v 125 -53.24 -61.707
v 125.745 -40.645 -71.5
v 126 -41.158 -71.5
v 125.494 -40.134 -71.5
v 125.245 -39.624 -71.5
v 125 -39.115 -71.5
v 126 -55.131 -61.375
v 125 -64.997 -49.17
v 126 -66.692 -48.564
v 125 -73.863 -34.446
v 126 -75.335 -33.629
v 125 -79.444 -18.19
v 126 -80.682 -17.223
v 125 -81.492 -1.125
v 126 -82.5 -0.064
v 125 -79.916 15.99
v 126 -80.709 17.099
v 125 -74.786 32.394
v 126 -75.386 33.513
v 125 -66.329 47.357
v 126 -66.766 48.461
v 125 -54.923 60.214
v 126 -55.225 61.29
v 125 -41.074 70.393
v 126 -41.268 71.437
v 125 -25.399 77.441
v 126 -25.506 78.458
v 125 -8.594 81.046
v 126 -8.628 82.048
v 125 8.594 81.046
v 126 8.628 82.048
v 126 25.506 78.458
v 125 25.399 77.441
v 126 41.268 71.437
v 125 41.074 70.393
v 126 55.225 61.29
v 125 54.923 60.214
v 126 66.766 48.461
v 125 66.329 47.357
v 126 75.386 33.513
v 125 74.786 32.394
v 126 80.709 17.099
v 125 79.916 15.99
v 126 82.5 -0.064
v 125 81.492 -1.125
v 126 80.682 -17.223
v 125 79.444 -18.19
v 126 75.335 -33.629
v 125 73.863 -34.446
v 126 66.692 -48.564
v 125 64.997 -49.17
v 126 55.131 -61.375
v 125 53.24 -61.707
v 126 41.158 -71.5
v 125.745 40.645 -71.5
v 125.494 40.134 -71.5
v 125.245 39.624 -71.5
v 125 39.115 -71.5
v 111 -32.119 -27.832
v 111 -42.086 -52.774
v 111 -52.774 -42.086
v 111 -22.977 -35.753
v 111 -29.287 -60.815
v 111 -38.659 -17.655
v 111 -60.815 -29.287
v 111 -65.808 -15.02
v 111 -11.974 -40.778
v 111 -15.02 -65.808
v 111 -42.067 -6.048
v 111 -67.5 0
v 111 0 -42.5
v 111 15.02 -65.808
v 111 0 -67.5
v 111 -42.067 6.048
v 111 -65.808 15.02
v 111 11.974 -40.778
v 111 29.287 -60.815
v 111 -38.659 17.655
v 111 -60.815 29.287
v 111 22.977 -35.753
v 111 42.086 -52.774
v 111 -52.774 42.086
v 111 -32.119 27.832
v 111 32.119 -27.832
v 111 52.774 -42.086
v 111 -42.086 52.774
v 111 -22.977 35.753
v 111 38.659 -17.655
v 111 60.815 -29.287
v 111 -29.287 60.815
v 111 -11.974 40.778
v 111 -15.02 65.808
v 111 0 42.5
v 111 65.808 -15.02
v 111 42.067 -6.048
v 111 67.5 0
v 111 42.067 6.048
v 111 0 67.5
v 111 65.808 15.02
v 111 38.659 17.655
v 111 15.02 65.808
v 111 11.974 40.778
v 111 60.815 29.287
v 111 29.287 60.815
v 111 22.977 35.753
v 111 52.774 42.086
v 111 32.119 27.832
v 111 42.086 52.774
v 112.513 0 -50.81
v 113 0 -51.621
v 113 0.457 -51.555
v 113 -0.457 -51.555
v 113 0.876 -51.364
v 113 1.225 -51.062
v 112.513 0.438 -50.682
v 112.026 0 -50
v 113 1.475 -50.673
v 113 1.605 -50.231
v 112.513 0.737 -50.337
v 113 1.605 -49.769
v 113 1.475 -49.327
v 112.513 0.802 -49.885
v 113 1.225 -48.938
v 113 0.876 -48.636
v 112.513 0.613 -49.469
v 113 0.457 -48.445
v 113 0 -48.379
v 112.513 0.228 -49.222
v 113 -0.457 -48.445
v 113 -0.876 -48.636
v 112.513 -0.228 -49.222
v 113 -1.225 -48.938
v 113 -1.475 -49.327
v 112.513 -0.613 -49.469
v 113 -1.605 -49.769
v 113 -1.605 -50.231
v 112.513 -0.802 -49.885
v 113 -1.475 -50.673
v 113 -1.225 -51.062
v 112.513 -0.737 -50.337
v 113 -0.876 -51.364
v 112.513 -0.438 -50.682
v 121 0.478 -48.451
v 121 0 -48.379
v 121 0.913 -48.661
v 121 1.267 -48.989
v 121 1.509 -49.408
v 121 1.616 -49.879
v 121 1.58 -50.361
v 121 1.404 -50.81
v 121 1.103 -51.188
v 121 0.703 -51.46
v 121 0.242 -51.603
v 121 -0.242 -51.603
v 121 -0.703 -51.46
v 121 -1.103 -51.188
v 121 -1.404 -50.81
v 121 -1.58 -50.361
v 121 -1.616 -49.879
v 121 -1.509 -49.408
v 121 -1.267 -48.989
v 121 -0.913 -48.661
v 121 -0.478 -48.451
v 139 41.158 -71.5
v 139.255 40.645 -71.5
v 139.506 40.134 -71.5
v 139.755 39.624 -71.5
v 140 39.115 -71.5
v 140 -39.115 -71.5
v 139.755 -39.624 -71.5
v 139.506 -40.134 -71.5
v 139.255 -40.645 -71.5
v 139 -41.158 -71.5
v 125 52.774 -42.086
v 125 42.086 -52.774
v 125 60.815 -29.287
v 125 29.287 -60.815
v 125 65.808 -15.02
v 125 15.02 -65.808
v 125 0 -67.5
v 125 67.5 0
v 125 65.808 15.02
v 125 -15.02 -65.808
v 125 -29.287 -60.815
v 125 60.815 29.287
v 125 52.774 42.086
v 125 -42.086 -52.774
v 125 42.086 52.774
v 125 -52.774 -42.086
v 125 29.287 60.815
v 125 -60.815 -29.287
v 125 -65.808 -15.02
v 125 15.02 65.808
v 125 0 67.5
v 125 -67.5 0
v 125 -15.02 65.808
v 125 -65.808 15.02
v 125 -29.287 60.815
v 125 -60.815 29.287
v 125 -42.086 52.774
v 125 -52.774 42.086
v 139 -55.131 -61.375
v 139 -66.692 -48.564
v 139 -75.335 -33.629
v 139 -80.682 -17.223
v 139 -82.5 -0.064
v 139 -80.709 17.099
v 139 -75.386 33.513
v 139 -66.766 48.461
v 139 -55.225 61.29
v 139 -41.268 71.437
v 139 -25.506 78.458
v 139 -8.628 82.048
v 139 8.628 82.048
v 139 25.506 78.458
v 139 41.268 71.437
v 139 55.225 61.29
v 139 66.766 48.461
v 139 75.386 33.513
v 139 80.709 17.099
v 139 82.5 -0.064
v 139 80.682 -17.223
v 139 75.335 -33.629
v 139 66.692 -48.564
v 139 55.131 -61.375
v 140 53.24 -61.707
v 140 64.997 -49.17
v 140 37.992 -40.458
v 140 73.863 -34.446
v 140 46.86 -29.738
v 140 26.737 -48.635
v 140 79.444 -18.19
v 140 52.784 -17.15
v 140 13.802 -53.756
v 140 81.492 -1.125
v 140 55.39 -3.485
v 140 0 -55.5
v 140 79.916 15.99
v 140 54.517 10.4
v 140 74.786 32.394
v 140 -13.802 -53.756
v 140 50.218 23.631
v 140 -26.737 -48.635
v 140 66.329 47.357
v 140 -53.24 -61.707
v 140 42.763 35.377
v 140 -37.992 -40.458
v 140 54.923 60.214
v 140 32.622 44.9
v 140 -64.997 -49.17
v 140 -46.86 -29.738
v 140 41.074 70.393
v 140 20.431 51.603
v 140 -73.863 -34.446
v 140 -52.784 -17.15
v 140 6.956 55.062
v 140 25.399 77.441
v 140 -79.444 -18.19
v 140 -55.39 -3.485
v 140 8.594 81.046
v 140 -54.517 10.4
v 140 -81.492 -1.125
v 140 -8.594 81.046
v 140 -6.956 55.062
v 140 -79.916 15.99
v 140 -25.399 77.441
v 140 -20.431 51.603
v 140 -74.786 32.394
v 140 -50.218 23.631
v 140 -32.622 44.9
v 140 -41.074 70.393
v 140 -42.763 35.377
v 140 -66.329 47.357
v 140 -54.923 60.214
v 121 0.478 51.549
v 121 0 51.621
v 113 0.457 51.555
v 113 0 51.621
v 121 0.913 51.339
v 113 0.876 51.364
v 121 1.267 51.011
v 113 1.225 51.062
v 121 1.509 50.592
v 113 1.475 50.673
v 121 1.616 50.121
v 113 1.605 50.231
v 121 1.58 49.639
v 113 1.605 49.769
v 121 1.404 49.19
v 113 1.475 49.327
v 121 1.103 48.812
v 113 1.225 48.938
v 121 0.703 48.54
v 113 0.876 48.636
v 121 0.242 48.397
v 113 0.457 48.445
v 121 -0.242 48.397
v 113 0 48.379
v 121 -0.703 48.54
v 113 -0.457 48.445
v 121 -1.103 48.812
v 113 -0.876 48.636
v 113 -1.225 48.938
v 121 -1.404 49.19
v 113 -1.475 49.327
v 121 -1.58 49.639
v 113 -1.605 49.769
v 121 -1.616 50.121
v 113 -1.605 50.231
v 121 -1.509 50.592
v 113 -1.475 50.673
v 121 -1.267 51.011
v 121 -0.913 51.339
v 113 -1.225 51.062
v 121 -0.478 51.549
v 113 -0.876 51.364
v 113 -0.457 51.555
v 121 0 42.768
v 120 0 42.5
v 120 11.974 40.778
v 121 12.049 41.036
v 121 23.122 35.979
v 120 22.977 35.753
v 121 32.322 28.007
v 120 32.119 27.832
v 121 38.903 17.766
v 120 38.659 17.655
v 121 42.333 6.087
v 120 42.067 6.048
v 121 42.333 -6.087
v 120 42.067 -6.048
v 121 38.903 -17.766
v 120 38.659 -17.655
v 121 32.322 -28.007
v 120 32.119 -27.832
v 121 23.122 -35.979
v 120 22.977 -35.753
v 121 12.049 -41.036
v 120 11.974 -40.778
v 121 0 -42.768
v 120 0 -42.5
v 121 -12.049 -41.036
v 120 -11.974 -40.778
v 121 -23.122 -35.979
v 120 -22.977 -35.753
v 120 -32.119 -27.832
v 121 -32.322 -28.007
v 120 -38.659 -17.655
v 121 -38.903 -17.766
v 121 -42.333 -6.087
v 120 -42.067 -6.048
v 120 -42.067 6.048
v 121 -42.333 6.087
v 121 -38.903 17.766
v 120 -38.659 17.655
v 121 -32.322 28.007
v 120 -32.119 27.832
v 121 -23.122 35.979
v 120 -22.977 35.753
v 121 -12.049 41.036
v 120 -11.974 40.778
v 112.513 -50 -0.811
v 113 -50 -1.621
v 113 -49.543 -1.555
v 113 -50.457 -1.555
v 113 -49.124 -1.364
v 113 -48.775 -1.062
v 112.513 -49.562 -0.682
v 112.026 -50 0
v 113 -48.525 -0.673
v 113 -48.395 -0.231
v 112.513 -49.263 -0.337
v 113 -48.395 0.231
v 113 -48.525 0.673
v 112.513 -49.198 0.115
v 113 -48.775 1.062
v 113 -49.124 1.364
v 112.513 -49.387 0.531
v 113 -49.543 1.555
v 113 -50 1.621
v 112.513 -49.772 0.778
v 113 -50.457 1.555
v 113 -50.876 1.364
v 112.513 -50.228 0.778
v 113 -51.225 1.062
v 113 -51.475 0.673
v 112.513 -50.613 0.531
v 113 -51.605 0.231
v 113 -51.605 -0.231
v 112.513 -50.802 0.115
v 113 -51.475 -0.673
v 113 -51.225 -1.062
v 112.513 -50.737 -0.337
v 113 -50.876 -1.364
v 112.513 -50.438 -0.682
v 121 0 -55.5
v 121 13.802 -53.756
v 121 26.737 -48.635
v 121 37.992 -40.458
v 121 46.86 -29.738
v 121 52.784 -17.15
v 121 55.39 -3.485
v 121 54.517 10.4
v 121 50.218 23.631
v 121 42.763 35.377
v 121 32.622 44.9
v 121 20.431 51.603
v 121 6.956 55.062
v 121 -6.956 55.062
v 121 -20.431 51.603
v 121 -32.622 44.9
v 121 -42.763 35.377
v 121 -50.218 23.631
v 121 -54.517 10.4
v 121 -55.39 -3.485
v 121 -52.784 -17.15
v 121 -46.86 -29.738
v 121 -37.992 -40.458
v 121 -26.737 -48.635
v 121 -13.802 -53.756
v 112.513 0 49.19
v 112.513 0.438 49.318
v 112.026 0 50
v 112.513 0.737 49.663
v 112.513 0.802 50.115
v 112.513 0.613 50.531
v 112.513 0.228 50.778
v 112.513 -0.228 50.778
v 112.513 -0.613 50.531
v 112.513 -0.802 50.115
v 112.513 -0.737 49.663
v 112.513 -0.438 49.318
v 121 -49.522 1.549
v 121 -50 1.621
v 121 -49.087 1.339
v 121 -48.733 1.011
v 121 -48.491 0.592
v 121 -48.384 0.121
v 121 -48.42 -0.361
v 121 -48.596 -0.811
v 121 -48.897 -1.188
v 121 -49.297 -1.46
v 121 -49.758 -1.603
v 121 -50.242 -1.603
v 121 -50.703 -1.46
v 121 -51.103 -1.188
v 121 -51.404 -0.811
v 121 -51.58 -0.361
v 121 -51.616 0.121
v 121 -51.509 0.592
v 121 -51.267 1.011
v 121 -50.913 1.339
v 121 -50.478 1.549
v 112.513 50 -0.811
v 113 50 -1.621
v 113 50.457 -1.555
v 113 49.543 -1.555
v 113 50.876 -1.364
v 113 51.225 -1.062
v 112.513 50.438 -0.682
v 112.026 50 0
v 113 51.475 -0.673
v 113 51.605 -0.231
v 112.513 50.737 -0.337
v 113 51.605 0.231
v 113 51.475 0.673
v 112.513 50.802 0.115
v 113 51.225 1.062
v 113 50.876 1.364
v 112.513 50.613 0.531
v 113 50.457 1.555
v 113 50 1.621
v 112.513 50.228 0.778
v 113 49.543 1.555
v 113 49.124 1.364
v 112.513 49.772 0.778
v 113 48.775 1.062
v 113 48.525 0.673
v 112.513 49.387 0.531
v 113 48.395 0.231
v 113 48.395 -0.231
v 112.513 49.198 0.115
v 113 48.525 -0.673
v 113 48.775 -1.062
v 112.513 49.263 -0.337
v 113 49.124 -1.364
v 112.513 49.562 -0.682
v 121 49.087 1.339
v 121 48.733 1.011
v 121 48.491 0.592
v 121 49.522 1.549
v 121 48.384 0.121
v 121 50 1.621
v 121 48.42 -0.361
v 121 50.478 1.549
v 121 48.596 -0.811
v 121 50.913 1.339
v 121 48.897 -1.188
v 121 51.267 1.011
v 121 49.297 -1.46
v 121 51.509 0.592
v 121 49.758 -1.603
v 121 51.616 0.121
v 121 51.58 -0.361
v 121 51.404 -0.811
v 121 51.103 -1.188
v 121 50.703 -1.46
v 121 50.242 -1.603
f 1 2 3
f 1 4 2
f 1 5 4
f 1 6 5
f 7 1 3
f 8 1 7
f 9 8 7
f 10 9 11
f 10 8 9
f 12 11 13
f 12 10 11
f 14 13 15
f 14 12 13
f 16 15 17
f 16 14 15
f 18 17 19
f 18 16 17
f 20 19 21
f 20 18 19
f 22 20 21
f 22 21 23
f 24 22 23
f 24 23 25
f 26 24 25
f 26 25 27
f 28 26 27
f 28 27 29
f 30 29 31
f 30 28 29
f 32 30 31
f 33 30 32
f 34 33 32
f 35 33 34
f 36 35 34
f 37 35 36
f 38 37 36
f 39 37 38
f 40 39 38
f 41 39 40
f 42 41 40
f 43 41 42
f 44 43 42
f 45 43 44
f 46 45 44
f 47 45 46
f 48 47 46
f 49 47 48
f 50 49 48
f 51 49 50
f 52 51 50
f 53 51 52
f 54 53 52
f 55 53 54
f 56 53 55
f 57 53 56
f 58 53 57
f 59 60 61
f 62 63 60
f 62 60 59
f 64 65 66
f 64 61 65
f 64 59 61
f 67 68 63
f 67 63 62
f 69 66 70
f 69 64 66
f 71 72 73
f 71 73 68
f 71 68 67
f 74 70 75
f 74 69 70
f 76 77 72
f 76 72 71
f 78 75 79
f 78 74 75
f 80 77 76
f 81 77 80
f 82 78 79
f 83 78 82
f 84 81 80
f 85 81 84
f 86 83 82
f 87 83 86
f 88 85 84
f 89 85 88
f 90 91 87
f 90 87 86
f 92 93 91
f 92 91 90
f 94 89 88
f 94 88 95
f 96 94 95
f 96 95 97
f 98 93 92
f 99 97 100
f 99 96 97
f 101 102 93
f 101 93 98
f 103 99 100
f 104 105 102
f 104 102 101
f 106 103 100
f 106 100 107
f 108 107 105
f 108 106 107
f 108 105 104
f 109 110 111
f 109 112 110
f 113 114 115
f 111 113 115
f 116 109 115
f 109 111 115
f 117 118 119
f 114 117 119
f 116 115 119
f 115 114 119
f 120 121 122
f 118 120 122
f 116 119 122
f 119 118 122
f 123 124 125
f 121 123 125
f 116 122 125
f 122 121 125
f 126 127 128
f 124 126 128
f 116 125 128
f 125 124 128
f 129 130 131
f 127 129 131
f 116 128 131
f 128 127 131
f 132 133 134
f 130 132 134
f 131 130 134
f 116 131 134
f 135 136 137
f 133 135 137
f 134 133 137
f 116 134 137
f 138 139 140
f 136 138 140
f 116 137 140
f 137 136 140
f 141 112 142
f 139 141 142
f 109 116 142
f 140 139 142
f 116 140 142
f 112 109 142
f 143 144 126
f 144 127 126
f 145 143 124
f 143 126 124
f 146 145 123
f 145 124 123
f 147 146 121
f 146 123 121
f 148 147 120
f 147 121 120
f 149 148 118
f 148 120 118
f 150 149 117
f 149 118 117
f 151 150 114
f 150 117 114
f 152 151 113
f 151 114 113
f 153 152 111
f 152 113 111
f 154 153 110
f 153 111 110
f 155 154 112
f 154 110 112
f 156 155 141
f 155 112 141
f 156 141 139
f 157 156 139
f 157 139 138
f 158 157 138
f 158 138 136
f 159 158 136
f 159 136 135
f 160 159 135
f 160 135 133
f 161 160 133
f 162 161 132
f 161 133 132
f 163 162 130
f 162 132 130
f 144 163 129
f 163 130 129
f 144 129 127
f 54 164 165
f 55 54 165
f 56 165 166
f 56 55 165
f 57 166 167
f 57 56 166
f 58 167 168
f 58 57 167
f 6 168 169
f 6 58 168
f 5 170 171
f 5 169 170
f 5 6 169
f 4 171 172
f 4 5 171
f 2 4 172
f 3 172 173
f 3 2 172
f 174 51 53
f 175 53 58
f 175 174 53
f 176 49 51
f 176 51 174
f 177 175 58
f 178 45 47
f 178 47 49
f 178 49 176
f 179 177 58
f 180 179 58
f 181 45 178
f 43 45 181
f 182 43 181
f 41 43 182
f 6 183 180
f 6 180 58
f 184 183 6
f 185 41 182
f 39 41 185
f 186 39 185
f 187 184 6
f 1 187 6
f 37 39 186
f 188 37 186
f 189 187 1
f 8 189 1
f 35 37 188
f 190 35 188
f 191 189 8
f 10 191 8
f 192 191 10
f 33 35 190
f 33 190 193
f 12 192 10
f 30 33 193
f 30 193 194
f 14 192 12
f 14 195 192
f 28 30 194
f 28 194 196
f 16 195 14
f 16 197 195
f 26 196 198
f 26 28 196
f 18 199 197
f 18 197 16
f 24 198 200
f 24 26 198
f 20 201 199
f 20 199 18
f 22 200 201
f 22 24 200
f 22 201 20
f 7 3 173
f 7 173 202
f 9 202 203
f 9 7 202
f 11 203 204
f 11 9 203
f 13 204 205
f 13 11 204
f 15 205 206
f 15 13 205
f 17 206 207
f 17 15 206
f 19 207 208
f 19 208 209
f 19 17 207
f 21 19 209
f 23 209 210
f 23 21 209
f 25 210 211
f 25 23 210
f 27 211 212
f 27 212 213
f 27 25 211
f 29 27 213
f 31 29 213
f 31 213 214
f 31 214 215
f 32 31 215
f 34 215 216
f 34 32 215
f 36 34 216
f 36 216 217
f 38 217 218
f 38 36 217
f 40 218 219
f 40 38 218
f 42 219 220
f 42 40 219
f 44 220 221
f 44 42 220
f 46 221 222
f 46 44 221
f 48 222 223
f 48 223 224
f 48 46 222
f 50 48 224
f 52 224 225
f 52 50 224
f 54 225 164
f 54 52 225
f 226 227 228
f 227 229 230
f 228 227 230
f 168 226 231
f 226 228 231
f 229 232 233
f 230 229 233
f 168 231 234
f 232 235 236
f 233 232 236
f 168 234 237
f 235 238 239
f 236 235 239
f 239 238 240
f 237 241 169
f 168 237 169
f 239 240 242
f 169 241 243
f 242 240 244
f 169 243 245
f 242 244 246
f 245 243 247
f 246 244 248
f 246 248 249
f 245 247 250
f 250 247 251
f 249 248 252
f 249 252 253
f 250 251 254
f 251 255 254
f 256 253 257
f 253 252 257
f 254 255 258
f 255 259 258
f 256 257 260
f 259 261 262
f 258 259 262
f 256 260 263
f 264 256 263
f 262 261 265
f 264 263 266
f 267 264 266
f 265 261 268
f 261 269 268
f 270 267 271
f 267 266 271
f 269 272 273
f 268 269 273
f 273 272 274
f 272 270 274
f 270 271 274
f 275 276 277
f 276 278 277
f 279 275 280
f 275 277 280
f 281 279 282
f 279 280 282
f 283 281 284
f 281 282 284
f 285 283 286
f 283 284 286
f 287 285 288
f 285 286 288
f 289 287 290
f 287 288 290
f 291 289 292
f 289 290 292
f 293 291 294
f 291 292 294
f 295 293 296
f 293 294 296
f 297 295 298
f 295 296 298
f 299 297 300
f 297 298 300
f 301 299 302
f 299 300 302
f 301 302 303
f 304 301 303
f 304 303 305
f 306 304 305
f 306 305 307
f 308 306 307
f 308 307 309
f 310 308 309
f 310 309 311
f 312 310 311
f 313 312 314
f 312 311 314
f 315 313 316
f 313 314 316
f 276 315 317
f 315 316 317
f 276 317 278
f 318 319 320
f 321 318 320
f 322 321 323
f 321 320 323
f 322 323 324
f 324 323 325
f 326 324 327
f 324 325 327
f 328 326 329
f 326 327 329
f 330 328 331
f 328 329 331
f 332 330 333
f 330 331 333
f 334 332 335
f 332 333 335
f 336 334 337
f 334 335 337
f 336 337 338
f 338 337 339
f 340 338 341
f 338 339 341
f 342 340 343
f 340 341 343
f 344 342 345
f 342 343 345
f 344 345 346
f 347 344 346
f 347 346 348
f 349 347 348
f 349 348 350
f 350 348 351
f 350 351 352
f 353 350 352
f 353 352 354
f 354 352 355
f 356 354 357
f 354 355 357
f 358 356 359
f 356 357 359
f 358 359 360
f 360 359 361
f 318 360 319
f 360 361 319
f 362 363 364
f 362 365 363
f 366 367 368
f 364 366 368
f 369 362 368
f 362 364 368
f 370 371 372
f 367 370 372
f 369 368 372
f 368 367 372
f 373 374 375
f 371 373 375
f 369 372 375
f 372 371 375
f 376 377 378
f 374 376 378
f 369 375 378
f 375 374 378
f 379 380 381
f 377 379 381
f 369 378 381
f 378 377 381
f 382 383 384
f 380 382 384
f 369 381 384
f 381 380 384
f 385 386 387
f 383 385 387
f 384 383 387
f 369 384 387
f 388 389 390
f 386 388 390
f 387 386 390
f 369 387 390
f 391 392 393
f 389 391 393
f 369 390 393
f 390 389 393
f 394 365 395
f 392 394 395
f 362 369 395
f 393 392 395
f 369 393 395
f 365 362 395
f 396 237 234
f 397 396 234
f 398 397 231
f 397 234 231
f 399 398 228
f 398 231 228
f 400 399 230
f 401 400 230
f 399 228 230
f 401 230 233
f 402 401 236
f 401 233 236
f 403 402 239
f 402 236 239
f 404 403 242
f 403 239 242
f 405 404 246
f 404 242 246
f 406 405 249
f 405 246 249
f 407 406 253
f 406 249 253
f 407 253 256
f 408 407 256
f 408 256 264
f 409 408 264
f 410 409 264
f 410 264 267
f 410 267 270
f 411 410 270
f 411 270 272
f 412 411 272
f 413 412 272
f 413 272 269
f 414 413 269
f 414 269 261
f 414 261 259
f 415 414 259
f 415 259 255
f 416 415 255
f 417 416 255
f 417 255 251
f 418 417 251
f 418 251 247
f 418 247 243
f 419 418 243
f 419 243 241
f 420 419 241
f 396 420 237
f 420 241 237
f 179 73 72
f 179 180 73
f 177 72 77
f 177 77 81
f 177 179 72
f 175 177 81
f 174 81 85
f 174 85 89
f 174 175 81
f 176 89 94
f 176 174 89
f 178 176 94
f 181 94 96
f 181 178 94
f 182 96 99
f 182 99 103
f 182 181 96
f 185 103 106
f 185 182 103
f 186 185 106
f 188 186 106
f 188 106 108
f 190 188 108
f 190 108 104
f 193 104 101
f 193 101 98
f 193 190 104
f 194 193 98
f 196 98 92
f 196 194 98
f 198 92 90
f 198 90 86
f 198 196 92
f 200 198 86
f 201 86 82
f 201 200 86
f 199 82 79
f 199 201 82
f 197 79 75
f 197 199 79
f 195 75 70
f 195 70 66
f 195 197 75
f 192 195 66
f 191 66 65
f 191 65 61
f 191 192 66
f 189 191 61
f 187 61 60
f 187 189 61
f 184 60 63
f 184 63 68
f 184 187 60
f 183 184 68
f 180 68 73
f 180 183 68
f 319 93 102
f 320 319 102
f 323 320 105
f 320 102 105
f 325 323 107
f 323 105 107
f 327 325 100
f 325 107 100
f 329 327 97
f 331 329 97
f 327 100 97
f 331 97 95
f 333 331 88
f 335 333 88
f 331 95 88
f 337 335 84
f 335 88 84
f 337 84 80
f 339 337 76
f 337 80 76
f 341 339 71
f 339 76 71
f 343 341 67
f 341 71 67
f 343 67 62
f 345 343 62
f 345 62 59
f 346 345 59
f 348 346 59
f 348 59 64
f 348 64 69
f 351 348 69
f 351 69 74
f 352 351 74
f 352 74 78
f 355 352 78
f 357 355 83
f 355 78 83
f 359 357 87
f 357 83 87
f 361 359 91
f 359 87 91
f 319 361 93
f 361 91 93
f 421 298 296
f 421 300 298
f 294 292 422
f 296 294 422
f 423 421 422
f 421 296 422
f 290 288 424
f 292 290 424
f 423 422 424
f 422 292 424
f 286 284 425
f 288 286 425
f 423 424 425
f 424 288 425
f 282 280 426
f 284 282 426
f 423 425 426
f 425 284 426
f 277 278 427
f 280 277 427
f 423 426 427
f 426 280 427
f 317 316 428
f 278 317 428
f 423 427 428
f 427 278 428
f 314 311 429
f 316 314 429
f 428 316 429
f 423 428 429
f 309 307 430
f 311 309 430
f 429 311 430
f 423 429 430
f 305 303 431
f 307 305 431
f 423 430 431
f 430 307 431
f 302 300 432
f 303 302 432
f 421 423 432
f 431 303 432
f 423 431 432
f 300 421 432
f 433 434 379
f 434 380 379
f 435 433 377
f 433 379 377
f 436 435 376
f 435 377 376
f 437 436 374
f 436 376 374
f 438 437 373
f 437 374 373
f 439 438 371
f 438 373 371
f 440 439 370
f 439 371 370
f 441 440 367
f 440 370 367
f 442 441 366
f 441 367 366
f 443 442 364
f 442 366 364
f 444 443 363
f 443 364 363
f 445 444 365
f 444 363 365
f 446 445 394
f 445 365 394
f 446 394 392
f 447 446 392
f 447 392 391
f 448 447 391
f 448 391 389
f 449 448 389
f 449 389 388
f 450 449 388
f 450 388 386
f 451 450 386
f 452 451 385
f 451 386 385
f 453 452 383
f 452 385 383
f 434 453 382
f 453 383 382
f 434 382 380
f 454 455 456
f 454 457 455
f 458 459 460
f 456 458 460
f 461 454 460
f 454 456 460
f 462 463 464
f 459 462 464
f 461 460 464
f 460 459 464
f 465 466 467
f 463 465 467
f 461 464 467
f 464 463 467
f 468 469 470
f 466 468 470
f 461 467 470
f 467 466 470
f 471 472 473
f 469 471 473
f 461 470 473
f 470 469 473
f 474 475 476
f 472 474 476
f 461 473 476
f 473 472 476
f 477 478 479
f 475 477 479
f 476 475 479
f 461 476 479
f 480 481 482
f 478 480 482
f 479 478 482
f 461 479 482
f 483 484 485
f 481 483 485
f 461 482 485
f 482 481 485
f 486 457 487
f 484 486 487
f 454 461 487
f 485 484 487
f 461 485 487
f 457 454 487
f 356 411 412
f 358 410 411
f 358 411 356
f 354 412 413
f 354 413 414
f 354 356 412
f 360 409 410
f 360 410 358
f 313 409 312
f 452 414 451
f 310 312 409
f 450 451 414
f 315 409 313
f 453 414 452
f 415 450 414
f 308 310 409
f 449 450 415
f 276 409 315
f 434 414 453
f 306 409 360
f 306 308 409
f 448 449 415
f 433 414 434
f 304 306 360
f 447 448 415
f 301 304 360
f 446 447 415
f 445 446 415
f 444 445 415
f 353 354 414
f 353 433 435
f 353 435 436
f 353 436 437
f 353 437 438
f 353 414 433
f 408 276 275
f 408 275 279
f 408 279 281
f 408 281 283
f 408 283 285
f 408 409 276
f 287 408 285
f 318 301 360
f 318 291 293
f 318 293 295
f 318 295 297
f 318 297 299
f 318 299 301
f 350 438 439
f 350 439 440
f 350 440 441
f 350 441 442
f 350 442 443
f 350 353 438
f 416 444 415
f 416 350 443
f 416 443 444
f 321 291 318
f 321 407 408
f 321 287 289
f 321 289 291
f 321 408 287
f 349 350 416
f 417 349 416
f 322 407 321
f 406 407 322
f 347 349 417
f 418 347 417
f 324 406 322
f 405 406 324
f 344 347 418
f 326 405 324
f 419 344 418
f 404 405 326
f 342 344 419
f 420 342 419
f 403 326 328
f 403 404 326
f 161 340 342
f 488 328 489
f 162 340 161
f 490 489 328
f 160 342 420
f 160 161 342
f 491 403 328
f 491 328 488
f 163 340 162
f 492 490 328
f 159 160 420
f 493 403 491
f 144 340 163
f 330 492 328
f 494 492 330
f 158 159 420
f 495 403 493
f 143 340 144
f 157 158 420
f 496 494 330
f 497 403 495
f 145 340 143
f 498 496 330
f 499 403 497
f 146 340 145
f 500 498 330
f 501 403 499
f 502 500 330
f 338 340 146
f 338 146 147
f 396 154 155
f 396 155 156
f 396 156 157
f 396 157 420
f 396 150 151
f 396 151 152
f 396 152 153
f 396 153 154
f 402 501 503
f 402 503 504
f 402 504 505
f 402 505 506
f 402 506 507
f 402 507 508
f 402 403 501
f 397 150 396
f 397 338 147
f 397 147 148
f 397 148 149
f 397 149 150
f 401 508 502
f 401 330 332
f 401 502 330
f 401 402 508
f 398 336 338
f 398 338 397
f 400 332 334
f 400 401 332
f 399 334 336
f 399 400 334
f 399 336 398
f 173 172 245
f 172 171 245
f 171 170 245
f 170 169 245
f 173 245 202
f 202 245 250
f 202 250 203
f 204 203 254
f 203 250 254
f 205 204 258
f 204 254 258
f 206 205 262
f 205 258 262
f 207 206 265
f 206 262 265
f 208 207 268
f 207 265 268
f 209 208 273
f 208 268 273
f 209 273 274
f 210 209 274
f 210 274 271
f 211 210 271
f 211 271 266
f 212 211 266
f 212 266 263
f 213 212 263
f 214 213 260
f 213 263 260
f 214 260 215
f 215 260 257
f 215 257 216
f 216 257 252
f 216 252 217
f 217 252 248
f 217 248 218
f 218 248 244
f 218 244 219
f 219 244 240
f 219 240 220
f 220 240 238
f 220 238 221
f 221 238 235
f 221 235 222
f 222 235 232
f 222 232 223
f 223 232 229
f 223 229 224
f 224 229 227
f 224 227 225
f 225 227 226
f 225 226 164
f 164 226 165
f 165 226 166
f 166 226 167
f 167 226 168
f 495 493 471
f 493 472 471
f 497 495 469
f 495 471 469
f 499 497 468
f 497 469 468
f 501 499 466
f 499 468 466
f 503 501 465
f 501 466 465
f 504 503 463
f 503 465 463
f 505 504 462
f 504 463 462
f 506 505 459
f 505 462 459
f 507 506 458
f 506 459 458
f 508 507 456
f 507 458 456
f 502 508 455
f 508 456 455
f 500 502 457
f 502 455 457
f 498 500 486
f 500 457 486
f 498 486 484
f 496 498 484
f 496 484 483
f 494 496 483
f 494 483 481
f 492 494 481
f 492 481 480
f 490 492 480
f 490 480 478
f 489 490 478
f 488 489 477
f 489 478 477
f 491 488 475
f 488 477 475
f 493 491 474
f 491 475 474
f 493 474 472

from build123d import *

# Parameters (mm, degrees)
EXTRUDE_1_DEPTH           = 15
SKETCH_2_W                = 14
SKETCH_2_H                = 67.5
HOLE_WIZARD_1_D           = 85
HOLE_WIZARD_1_CBORE_D     = 111
HOLE_WIZARD_1_CBORE_DEPTH = 19
HOLE_WIZARD_2_D           = 3.242
HOLE_WIZARD_2_DEPTH       = 8
HOLE_WIZARD_2_TIP         = 0.973995063
CHAMFER_1_SIZE            = 0.999999999
CHAMFER_1_SIZE2           = 1.000000001
CHAMFER_2_SIZE            = 0.267949192
CHAMFER_2_SIZE2           = 1


with BuildPart() as part:
    # 草圖1 → 填料-伸長1 (new body)
    with BuildSketch(Plane(origin=(125, 0, 0), x_dir=(0, -1, 0), z_dir=(-1, 0, 0))):
        with BuildLine():
            Line((-41.158231255, -71.5), (41.158231255, -71.5))
            ThreePointArc((41.158231255, -71.5), (0, 82.5), (-41.158231255, -71.5))
        make_face()
    extrude(amount=-EXTRUDE_1_DEPTH)

    # 草圖2 → 旋轉1 (revolve)
    with BuildSketch(Plane.XY, mode=Mode.PRIVATE) as revolve_1_sk:
        with Locations((118, 33.75)):
            Rectangle(SKETCH_2_W, SKETCH_2_H)
    revolve(revolve_1_sk.sketch.rotate(Axis((111, 0, 0), (1, 0, 0)), 270), axis=Axis((111, 0, 0), (1, 0, 0)))

    # 鑽孔1 (through all)
    with Locations(Plane(origin=(140, 0, 0), x_dir=(0, 0, -1), z_dir=(1, 0, 0))):
        with Locations((0, 0)):
            CounterBoreHole(HOLE_WIZARD_1_D / 2, HOLE_WIZARD_1_CBORE_D / 2, HOLE_WIZARD_1_CBORE_DEPTH)

    # 鑽孔2
    with Locations(Plane(origin=(121, 0, 0), x_dir=(0, 0, -1), z_dir=(1, 0, 0))):
        with Locations((0, 50), (-50, 0), (0, -50), (50, 0)):
            Hole(HOLE_WIZARD_2_D / 2, depth=HOLE_WIZARD_2_DEPTH)
            with Locations((0, 0, -(HOLE_WIZARD_2_DEPTH + HOLE_WIZARD_2_TIP / 2))):  # 118° drill point
                Cone(0, HOLE_WIZARD_2_D / 2, HOLE_WIZARD_2_TIP, mode=Mode.SUBTRACT)

    # 導角1
    chamfer_1_edges = [part.edges().sort_by_distance(p)[0] for p in [
        (125, 0, 82.5),
        (140, 0, 82.5),
    ]]
    chamfer_1_side = [part.faces().sort_by_distance(p)[0] for p in [
        (132.5, 0, 82.5),
    ]]
    chamfer(chamfer_1_edges, length=CHAMFER_1_SIZE, length2=CHAMFER_1_SIZE2, reference=chamfer_1_side[0])

    # 導角2
    chamfer_2_edges = [part.edges().sort_by_distance(p)[0] for p in [
        (121, 0, -42.5),
    ]]
    chamfer_2_side = [part.faces().sort_by_distance(p)[0] for p in [
        (121, 0, 53.930222946),
    ]]
    chamfer(chamfer_2_edges, length=CHAMFER_2_SIZE, length2=CHAMFER_2_SIZE2, reference=chamfer_2_side[0])


solid = part.part
